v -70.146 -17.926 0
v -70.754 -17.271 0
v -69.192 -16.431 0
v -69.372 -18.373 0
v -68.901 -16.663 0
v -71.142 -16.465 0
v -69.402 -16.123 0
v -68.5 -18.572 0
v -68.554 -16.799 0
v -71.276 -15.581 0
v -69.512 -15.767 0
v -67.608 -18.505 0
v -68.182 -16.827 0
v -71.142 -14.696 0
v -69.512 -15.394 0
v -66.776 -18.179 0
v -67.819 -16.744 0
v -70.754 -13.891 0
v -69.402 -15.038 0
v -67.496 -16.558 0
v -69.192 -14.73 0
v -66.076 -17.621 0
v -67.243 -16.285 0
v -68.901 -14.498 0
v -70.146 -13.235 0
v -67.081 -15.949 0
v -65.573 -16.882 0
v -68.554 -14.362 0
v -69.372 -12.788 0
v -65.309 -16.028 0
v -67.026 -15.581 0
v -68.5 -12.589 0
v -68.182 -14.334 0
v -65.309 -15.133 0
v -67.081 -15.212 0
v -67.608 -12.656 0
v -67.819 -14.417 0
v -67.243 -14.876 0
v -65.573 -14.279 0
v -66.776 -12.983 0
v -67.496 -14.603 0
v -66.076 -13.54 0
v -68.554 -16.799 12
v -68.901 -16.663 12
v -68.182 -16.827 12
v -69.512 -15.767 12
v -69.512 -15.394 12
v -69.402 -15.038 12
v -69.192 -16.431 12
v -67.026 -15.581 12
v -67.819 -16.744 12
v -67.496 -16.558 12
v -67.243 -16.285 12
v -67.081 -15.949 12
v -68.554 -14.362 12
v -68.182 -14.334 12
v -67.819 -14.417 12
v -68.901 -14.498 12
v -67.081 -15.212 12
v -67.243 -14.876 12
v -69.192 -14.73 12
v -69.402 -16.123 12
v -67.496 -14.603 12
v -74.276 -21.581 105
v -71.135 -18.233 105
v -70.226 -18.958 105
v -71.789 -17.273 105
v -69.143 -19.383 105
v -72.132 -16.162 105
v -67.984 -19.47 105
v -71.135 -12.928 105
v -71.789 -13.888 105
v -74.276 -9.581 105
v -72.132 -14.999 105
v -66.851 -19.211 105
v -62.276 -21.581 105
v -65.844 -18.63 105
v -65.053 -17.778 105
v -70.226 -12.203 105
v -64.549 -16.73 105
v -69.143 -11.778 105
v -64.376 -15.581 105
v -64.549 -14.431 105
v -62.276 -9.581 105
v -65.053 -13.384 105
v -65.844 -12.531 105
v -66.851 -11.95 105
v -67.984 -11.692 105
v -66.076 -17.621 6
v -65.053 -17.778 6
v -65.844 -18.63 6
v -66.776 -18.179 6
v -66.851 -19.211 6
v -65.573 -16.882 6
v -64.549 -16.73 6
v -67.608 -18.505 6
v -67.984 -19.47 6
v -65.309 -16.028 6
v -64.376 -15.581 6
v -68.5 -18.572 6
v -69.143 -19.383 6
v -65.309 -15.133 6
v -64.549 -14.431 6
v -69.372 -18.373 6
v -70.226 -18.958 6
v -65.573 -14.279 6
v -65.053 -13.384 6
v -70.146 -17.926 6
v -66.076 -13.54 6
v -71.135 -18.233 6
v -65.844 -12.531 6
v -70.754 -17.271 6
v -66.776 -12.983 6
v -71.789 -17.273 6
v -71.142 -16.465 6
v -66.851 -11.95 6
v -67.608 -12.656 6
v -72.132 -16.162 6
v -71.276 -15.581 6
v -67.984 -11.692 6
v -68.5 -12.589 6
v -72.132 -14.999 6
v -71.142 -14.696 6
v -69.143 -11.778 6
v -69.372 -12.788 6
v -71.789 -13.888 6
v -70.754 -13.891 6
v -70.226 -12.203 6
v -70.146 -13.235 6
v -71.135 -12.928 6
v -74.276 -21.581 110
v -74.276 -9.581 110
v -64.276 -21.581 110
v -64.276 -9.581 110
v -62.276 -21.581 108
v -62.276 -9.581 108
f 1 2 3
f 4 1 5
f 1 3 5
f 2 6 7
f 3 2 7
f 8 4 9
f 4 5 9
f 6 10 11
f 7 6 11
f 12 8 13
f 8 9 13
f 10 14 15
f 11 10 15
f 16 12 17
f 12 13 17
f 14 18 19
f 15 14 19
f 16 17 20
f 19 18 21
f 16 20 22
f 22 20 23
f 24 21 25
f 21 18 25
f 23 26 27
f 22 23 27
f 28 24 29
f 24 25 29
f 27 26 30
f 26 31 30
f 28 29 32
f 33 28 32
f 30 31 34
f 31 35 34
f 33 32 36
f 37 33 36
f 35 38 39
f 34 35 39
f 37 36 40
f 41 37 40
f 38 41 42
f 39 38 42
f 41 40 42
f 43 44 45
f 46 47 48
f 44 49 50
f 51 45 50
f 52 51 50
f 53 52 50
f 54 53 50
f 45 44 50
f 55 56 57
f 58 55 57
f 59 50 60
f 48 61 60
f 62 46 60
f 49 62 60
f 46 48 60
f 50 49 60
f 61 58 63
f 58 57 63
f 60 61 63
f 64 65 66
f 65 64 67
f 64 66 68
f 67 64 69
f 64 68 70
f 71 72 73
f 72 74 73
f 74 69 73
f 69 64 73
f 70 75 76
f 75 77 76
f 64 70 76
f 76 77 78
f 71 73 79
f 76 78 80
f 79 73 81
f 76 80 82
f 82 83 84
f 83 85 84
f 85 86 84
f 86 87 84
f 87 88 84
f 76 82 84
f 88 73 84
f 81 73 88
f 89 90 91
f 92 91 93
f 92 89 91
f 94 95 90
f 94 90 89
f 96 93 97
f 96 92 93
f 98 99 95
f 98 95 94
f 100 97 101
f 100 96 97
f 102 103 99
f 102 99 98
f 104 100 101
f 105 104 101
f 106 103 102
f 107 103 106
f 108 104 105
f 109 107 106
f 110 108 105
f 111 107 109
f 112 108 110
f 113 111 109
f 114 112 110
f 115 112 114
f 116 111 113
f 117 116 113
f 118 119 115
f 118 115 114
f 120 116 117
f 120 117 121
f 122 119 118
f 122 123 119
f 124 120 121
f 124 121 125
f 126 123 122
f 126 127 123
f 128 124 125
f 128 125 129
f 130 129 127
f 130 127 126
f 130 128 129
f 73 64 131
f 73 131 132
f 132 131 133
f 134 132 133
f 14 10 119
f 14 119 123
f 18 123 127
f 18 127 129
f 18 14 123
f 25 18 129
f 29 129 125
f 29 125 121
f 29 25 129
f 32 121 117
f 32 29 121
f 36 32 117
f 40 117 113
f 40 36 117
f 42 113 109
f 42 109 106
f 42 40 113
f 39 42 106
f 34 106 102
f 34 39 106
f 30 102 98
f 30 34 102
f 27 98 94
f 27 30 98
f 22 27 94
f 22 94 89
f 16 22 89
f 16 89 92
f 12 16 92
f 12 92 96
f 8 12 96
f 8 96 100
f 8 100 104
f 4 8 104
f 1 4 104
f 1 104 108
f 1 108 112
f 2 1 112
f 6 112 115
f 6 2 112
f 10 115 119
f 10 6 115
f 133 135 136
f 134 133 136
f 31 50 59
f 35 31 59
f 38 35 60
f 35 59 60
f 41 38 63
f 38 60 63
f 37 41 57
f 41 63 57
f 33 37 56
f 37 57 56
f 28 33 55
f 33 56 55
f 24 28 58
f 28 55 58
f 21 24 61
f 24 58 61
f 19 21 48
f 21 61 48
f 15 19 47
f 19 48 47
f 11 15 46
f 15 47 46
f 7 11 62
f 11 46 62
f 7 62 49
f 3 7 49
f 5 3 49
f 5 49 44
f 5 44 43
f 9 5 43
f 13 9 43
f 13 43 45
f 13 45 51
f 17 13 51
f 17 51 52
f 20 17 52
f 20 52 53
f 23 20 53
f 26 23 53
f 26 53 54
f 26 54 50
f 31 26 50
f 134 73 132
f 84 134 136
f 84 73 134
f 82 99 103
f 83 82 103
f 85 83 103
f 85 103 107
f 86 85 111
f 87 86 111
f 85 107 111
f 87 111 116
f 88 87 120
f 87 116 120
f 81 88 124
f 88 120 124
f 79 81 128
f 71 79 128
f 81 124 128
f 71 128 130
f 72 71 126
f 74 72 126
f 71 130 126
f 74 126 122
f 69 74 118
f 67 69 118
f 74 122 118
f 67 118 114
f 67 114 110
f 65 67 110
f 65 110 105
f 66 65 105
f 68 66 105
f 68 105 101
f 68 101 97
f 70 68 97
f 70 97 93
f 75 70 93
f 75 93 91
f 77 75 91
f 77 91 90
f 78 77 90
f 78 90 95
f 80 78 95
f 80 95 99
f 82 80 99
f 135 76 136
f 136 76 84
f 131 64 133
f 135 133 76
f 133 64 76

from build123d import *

# Parameters (mm, degrees)
ESQUISSE1_R                                   = 3.9
BOSS_EXTRU_1_DEPTH                            = 105
ESQUISSE2_W                                   = 12
ESQUISSE2_H                                   = 12
BOSS_EXTRU_2_DEPTH                            = 5
ESQUISSE14_R                                  = 3.9
ESQUISSE14_R_2                                = 3
ENL_V_MAT_EXTRU_1_DEPTH                       = 6
CHANFREIN1_SIZE                               = 2
TROU_POUR_TARAUDAGE_POUR_TROU_TARAUD_M3_D     = 2.5
TROU_POUR_TARAUDAGE_POUR_TROU_TARAUD_M3_DEPTH = 12


with BuildPart() as part:
    # Esquisse1 → Boss.-Extru.1 (new body)
    with BuildSketch(Plane.XY):
        with Locations((-68.275651986, -15.580620135)):
            Circle(ESQUISSE1_R)
    extrude(amount=BOSS_EXTRU_1_DEPTH)

    # Esquisse2 → Boss.-Extru.2 (add)
    with BuildSketch(Plane.XY.offset(105)):
        with Locations((-68.275651986, -15.580620135)):
            Rectangle(ESQUISSE2_W, ESQUISSE2_H)
    extrude(amount=BOSS_EXTRU_2_DEPTH)

    # Esquisse14 → Enlèv. mat.-Extru.1 (cut)
    with BuildSketch(Plane(origin=(0, 0, 0), x_dir=(-1, 0, 0), z_dir=(0, 0, -1))):
        with Locations((68.275651986, -15.580620135)):
            Circle(ESQUISSE14_R)
        with Locations((68.275651986, -15.580620135)):
            Circle(ESQUISSE14_R_2, mode=Mode.SUBTRACT)
    extrude(amount=-ENL_V_MAT_EXTRU_1_DEPTH, mode=Mode.SUBTRACT)

    # Chanfrein1
    chanfrein1_edges = [part.edges().sort_by_distance(p)[0] for p in [
        (-62.275651986, -15.580620135, 110),
    ]]
    chamfer(chanfrein1_edges, length=CHANFREIN1_SIZE)

    # Trou pour taraudage pour trou taraudé M3x0.51
    with Locations(Plane(origin=(0, 0, 0), x_dir=(-1, 0, 0), z_dir=(0, 0, -1))):
        with Locations((68.275651986, -15.580620135)):
            Hole(TROU_POUR_TARAUDAGE_POUR_TROU_TARAUD_M3_D / 2, depth=TROU_POUR_TARAUDAGE_POUR_TROU_TARAUD_M3_DEPTH)


solid = part.part
